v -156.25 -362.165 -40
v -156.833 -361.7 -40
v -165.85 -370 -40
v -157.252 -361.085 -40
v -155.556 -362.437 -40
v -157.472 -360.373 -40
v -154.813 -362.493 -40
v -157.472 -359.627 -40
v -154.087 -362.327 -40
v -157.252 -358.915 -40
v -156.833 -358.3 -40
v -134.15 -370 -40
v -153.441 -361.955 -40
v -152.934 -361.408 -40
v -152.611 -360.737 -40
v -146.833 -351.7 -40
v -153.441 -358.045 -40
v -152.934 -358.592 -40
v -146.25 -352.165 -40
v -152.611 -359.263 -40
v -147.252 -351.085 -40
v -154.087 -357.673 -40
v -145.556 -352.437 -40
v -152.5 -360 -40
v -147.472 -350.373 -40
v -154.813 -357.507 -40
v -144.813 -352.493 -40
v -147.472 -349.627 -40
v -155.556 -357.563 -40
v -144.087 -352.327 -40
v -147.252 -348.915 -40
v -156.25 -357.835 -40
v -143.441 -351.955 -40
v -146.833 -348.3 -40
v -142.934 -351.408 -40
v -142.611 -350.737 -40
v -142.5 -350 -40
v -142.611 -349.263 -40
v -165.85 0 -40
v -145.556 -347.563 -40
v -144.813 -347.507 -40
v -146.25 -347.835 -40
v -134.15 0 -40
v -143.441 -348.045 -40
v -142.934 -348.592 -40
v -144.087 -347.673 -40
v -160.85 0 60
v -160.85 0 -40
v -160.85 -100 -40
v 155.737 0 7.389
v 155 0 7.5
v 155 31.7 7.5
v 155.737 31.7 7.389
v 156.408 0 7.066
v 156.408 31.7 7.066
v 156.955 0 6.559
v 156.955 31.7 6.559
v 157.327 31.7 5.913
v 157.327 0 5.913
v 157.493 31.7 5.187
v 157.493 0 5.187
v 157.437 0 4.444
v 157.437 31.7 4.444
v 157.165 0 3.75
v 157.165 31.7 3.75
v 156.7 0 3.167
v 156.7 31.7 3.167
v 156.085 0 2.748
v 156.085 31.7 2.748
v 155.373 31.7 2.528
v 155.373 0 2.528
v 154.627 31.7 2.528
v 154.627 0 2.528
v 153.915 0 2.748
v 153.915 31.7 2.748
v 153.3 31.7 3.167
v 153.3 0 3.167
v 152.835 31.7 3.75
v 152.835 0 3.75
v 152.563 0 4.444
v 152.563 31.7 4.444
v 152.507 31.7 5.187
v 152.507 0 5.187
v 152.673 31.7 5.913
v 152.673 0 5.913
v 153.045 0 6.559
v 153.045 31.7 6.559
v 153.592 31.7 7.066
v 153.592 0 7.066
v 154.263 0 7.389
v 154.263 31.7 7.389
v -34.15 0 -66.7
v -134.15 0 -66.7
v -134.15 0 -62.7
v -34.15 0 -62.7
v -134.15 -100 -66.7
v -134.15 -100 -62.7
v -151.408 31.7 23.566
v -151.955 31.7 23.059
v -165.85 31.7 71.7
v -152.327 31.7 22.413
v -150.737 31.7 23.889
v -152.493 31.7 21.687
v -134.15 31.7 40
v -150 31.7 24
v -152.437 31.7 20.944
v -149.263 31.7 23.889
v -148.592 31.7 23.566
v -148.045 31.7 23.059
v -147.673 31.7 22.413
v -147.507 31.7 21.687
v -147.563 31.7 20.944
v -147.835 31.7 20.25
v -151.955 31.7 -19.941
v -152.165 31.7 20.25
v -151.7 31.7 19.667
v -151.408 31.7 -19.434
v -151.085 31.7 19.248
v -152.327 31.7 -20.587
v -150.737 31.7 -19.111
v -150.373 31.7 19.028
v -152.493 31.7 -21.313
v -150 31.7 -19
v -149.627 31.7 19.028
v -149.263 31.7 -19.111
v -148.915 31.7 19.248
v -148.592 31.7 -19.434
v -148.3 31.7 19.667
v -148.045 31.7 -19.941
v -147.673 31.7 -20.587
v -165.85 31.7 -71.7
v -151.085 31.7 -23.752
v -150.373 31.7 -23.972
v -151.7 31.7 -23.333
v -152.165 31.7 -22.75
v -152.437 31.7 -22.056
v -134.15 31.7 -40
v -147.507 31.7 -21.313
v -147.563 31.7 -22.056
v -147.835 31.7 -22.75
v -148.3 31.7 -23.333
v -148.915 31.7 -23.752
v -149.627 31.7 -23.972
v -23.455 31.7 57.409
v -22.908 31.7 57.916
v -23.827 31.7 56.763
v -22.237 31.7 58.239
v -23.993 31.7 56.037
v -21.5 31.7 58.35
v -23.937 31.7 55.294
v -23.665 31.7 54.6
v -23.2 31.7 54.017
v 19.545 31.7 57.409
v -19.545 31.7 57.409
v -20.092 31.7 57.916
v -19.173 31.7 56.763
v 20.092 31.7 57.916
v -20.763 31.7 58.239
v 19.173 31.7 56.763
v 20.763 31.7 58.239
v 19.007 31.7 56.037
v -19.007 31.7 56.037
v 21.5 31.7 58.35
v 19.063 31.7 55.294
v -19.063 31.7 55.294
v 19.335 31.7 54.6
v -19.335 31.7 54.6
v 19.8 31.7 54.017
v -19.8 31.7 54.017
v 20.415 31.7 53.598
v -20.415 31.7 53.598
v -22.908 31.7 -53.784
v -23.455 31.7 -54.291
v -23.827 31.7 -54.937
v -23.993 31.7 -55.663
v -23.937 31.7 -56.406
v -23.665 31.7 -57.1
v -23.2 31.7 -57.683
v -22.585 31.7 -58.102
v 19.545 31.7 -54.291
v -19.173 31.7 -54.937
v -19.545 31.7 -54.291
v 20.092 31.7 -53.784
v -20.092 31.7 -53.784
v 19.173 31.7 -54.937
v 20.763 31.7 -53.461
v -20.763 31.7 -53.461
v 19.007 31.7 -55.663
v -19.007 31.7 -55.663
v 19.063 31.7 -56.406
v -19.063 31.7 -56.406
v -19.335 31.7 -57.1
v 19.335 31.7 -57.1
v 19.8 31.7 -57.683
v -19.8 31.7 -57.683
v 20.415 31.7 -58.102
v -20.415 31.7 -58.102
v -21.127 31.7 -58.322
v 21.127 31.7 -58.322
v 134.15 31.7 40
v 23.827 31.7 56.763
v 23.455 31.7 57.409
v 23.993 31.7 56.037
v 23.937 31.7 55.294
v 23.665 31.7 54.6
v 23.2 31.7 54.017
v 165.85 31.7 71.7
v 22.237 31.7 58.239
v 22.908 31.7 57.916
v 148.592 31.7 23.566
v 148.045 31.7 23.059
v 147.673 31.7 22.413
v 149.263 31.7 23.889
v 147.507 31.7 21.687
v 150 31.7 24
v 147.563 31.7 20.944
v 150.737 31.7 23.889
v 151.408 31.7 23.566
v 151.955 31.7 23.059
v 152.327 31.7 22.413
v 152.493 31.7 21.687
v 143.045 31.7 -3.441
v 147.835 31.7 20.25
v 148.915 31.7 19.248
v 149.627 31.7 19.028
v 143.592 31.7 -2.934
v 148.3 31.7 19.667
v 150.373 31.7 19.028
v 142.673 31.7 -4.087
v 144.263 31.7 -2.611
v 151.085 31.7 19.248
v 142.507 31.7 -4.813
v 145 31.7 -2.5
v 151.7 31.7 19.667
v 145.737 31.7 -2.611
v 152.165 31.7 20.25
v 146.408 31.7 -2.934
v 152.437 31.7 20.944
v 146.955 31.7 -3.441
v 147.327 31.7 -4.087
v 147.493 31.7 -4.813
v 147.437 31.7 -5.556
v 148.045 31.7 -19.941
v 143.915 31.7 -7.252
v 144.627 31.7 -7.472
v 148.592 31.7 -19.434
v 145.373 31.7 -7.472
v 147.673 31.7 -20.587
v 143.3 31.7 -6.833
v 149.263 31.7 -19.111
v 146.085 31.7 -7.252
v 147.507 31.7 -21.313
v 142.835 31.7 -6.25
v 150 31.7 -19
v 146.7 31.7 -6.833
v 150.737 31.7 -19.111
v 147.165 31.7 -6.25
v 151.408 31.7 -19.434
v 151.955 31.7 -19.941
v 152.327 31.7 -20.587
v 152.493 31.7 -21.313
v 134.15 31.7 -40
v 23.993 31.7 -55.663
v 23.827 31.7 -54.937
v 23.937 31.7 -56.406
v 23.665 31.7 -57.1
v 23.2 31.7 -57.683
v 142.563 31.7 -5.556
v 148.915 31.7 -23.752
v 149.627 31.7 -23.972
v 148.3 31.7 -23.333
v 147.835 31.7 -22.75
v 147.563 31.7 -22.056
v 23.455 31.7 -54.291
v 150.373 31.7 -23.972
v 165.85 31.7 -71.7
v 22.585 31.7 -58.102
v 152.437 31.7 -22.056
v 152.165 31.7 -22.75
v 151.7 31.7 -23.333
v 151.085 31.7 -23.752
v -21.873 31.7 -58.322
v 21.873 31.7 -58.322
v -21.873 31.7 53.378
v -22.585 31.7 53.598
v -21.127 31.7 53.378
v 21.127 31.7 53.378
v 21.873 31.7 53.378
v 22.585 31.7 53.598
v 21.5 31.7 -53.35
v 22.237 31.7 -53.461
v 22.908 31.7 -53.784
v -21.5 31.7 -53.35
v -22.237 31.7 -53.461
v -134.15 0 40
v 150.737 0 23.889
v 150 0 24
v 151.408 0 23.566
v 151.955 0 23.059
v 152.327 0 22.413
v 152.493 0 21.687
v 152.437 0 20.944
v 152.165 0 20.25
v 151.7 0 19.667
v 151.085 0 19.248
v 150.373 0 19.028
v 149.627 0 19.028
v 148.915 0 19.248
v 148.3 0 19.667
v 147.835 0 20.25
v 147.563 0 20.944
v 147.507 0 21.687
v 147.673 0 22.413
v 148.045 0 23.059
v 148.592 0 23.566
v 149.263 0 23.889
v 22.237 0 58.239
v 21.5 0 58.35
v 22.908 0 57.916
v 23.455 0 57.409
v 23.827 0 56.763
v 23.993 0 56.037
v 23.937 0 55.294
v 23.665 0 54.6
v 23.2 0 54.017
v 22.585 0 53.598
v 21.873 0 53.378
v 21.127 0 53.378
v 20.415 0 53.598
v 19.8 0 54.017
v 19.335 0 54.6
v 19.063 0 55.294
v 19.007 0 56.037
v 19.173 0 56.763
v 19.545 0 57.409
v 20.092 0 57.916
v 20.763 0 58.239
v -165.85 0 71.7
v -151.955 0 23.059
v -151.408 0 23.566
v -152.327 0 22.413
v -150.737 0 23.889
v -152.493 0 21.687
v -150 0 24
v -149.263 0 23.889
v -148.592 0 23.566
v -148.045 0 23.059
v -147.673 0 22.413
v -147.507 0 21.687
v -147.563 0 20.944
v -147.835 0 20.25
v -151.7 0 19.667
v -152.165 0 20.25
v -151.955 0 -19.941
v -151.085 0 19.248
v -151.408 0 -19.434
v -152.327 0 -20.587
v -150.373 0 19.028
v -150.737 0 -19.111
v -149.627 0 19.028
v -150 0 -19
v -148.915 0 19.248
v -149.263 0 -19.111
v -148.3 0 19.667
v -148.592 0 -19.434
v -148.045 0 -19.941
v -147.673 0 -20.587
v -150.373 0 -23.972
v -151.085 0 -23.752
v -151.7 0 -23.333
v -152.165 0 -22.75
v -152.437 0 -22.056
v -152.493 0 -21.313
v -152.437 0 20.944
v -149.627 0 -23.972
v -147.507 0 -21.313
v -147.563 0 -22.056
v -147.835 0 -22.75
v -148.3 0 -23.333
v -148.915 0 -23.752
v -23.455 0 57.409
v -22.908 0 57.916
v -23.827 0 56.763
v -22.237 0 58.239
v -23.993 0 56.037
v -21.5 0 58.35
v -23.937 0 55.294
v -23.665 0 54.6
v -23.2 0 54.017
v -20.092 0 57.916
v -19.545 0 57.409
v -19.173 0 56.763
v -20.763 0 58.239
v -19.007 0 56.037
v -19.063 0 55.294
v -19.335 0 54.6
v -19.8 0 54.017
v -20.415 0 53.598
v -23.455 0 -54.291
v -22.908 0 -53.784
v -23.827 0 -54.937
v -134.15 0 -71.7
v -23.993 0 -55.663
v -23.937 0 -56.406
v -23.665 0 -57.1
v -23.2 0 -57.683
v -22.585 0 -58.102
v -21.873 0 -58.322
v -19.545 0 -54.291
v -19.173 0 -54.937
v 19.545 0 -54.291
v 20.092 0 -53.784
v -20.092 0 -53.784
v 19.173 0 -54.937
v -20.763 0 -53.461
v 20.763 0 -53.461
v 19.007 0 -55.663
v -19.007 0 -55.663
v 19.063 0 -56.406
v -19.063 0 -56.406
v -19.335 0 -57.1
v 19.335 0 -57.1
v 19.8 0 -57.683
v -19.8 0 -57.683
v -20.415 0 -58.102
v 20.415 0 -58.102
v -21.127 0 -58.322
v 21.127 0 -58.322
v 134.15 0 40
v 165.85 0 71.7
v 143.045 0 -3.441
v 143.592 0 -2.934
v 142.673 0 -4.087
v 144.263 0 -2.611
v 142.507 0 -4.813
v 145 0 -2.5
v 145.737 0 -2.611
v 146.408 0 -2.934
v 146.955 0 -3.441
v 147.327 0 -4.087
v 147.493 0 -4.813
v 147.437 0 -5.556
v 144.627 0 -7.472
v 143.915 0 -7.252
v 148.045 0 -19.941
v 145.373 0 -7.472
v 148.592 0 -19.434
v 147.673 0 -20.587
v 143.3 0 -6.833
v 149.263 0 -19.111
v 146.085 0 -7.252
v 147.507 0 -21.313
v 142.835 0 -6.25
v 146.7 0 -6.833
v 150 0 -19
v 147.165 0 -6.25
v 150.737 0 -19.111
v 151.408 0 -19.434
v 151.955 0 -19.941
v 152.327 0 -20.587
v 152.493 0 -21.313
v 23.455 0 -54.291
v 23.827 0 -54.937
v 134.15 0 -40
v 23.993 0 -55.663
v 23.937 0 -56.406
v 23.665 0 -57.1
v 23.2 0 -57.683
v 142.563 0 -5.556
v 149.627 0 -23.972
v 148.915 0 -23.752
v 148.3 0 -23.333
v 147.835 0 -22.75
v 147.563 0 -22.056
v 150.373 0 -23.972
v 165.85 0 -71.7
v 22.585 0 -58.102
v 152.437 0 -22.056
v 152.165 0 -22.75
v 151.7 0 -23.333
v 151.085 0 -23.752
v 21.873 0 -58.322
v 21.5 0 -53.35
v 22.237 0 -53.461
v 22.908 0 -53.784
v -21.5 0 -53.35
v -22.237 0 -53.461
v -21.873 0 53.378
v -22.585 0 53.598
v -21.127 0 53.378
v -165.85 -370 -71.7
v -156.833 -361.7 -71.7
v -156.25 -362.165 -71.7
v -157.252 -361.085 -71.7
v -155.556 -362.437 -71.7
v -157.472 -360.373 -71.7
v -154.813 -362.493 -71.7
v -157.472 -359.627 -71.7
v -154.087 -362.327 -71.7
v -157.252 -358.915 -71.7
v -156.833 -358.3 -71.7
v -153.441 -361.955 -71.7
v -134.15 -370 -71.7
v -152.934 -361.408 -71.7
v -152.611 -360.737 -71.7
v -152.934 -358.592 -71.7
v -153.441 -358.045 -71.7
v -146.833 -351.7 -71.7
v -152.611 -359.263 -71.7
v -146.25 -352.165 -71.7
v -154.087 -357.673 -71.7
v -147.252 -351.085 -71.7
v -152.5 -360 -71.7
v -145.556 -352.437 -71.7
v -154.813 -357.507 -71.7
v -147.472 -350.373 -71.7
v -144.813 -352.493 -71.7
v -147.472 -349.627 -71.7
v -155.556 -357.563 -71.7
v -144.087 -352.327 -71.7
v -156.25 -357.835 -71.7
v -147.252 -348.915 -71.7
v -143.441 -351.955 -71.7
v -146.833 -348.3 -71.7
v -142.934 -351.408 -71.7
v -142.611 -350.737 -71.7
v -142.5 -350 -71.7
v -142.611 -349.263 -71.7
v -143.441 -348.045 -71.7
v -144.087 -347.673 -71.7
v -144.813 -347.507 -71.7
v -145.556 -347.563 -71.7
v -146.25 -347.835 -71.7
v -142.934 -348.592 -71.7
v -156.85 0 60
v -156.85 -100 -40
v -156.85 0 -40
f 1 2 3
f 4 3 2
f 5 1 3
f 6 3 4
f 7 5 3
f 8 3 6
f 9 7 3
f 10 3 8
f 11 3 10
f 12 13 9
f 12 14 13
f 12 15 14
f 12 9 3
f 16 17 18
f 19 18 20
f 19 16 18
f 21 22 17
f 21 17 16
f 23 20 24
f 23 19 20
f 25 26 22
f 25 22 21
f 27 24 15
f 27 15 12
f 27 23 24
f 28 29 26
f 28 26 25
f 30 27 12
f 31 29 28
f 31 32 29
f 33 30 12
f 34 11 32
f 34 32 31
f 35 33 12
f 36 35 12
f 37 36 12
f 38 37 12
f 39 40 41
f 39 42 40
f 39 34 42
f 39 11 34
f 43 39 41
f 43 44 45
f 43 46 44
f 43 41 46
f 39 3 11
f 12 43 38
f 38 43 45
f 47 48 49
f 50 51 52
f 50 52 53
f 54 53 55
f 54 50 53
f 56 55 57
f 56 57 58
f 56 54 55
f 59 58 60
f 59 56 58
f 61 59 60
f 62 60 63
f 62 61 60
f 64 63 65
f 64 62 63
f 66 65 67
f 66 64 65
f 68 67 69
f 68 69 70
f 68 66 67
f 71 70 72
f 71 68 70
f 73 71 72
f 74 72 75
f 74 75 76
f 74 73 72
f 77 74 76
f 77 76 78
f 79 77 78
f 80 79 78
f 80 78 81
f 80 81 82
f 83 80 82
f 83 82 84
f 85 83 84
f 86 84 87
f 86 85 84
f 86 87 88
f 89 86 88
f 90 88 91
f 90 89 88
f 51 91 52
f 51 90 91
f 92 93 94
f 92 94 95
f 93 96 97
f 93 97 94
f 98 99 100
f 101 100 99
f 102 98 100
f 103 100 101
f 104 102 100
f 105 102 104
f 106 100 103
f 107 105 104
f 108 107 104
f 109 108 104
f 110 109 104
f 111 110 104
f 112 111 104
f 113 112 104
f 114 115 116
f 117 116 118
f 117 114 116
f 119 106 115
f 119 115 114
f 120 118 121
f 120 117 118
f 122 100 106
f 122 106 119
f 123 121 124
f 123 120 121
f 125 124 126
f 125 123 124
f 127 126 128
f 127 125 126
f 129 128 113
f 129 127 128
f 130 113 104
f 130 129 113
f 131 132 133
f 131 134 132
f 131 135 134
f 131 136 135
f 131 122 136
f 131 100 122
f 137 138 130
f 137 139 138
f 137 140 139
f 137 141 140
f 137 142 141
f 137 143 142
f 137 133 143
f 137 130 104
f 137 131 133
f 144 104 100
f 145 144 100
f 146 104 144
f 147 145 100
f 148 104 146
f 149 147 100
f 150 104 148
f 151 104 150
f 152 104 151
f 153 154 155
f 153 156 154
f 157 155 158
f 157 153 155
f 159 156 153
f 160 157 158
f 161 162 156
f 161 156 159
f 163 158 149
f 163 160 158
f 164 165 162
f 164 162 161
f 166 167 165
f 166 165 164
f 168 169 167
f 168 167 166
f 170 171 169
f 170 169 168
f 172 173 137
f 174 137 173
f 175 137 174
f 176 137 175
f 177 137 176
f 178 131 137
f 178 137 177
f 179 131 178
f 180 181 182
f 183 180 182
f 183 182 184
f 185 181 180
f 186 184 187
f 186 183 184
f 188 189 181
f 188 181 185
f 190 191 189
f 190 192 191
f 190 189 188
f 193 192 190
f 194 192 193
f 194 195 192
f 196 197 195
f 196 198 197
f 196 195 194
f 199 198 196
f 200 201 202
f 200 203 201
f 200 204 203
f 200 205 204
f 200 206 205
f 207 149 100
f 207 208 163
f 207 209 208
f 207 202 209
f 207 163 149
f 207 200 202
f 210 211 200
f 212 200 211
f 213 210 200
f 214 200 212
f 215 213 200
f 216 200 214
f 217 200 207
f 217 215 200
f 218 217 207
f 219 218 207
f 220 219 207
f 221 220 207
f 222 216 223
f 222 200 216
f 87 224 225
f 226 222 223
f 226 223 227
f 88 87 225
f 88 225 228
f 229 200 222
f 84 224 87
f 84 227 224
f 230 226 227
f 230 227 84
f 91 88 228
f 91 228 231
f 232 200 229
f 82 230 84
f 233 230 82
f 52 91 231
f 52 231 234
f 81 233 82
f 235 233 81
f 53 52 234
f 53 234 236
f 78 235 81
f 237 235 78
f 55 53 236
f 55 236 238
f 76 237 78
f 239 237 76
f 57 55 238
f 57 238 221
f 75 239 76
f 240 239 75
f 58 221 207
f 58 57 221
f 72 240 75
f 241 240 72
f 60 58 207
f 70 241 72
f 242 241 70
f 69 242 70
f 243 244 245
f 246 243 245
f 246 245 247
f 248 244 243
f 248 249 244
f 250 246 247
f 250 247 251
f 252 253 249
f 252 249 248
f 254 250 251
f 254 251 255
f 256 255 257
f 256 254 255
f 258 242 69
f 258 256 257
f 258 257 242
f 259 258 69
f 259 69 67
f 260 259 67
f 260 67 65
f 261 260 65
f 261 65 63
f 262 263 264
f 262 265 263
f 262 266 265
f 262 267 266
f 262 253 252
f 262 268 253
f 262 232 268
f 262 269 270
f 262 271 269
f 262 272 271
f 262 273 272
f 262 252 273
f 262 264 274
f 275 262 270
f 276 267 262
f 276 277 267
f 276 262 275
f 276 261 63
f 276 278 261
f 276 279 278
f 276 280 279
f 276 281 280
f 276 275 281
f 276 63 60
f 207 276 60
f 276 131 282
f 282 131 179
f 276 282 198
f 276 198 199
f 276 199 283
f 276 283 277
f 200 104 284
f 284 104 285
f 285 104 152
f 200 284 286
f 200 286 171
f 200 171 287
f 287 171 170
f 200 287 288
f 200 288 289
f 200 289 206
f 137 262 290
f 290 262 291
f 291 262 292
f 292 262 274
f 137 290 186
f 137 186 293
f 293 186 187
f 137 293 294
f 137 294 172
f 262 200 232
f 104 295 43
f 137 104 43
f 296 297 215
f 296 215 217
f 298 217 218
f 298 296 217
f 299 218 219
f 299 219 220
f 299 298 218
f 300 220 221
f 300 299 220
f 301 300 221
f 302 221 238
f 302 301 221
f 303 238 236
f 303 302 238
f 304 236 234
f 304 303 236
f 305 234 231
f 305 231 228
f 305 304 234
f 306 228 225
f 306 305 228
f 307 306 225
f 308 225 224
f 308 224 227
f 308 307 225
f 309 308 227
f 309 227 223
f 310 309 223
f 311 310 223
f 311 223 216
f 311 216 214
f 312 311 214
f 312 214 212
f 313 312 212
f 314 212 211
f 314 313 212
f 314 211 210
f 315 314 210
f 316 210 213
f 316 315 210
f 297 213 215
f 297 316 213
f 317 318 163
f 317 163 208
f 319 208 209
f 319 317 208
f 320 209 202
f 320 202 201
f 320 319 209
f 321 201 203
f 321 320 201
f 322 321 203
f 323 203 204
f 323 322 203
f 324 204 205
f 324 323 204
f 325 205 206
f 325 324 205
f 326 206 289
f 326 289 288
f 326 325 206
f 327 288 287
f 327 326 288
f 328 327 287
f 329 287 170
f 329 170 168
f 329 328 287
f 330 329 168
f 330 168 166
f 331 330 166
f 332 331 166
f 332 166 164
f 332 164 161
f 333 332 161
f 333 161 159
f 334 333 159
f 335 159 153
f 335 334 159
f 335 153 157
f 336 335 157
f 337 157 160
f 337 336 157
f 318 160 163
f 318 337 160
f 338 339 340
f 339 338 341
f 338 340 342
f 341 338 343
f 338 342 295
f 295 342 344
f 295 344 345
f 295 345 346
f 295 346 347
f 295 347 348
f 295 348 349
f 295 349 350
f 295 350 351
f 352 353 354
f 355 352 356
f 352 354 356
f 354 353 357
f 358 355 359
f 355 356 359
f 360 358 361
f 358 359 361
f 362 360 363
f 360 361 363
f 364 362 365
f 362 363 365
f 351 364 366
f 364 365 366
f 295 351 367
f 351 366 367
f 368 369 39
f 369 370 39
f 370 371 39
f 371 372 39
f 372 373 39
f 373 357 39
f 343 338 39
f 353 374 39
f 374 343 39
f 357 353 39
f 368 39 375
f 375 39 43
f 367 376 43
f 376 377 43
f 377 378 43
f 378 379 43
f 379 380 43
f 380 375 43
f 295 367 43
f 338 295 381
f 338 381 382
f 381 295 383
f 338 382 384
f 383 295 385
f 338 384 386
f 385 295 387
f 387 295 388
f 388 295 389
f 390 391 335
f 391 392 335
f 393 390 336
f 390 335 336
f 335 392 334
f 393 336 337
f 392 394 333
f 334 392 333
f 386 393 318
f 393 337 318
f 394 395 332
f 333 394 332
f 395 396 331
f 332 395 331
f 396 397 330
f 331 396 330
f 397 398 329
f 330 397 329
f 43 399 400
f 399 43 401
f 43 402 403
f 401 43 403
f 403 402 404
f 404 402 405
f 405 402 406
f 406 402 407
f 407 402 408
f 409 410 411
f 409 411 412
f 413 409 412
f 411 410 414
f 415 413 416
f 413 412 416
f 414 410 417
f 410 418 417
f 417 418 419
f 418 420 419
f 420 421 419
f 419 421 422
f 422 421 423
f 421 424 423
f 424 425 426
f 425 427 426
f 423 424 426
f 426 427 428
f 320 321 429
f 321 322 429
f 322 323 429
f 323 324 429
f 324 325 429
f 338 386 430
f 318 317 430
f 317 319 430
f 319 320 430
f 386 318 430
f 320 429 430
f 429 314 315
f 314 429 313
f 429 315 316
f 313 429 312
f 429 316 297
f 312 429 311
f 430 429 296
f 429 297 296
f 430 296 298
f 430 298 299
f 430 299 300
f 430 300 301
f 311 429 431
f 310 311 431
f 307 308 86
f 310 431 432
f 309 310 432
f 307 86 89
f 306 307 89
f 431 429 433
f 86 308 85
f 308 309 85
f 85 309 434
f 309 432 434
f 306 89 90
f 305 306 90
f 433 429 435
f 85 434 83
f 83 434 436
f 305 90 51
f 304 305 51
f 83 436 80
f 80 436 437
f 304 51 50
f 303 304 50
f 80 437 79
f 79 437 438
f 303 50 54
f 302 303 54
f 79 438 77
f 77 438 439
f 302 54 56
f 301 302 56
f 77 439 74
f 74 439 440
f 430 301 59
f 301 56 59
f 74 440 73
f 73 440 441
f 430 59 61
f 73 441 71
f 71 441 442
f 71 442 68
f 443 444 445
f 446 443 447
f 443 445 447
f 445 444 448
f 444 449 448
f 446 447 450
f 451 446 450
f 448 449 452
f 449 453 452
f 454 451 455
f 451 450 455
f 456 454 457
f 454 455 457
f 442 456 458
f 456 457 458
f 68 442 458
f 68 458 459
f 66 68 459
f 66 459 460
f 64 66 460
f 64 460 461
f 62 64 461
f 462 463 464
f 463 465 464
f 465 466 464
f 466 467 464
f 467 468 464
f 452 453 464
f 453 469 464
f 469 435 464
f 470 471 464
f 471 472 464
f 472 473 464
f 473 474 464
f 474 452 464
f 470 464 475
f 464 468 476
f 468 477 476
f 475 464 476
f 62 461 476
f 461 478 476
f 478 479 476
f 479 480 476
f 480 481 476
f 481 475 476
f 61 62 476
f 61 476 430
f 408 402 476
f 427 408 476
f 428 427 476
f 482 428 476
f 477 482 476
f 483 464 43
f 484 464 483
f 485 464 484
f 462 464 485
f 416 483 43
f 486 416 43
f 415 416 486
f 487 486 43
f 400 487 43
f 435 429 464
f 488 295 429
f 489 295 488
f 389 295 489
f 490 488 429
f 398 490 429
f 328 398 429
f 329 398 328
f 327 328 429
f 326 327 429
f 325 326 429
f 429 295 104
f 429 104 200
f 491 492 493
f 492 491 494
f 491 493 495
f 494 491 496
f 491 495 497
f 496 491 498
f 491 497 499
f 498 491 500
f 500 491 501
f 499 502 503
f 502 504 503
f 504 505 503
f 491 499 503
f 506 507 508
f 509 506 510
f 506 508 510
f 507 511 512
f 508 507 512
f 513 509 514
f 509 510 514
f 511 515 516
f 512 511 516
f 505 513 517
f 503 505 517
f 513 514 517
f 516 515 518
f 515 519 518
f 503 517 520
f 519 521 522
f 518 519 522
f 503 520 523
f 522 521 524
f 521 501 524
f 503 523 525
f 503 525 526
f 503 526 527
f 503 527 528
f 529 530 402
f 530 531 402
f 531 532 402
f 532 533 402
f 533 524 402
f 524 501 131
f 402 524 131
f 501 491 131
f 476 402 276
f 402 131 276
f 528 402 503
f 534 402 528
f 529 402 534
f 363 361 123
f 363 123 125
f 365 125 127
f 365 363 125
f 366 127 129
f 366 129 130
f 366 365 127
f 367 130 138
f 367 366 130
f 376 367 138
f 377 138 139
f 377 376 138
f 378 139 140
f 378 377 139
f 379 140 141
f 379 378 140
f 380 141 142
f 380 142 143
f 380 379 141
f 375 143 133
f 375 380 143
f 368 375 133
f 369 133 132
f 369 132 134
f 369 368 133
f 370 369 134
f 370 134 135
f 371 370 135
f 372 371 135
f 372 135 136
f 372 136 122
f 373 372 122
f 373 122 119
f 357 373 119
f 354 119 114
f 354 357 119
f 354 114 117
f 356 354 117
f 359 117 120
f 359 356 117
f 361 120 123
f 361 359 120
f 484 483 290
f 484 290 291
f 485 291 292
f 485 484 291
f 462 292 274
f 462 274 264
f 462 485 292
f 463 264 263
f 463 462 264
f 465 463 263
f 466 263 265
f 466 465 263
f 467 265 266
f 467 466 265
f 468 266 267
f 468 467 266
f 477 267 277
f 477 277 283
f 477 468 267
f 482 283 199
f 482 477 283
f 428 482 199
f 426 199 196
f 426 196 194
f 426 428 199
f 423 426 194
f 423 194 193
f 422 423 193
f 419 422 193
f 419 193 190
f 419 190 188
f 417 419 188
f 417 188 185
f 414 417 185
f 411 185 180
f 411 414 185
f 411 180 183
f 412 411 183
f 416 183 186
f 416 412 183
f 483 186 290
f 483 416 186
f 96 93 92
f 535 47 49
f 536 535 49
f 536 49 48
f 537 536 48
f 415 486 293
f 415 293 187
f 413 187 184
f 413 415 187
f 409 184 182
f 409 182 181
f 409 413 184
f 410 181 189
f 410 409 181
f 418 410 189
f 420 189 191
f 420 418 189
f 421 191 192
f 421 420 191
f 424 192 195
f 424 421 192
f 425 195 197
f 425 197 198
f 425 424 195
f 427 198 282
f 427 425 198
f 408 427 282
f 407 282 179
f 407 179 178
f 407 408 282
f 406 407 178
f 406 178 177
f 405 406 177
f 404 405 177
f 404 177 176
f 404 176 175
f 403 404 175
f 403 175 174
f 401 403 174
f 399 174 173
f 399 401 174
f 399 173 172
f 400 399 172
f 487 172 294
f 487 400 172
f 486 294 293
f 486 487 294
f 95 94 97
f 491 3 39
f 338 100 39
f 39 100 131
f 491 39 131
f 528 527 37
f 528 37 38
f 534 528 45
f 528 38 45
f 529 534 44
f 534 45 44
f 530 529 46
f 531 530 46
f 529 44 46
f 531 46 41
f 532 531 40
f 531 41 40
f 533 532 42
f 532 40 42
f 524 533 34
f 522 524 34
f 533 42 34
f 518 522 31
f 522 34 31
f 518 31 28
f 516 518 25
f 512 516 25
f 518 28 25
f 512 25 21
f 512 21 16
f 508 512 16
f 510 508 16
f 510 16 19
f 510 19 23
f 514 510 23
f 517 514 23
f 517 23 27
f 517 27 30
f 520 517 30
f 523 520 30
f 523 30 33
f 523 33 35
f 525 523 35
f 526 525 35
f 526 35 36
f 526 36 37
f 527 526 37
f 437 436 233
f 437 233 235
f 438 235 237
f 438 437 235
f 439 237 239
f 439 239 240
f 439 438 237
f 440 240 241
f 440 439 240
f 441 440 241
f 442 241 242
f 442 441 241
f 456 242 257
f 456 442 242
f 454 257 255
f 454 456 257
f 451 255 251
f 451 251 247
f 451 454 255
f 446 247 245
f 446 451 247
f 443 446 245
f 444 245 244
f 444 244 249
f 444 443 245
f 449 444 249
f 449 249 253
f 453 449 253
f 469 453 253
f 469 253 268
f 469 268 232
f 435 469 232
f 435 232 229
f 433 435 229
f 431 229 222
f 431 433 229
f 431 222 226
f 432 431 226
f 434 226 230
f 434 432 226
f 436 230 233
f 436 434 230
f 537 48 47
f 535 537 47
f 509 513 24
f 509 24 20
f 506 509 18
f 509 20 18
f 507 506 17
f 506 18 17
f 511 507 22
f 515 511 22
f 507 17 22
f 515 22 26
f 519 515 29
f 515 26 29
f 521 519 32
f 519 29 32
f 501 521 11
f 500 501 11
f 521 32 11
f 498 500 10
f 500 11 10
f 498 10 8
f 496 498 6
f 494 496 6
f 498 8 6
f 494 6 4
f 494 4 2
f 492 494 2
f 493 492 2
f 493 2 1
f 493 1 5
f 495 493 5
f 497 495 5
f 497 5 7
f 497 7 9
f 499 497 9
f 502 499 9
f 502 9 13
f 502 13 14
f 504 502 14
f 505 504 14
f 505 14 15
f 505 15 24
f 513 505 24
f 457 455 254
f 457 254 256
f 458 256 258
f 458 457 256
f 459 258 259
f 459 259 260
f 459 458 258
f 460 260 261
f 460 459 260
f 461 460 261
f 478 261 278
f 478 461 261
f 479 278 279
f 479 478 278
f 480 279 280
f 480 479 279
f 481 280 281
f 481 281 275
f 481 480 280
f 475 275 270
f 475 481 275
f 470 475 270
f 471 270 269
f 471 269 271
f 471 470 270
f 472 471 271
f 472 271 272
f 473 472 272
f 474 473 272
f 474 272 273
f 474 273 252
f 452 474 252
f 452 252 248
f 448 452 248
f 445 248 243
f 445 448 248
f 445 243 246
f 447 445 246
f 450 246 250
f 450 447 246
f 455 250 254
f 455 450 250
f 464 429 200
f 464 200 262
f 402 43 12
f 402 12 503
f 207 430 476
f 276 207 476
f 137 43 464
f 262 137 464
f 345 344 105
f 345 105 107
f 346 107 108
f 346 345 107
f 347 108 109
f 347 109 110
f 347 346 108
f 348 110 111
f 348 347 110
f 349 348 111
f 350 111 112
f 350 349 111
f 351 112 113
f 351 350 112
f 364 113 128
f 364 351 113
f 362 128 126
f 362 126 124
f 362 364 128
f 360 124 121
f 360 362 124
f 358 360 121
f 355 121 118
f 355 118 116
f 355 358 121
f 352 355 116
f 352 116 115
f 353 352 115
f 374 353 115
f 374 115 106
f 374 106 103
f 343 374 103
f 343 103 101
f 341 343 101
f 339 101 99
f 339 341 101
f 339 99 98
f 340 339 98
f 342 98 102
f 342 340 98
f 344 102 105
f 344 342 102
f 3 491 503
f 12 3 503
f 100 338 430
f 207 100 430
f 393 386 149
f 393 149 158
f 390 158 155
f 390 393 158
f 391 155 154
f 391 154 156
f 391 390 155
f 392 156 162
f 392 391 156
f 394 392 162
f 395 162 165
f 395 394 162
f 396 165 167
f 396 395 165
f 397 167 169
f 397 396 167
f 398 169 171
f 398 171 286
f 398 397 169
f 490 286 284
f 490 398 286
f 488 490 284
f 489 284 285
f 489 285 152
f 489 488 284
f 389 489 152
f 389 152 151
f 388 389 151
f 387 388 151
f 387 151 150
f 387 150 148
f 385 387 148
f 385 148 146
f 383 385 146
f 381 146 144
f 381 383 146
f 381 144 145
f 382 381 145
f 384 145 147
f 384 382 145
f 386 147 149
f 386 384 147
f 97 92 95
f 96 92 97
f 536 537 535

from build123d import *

# Parameters (mm, degrees)
ESBO_O1_W                = 331.7
ESBO_O1_H                = 143.4
RESSALTO_EXTRUS_O2_DEPTH = 31.7
ESBO_O3_W                = 268.3
ESBO_O3_H                = 80
CORTE_EXTRUS_O1_DEPTH    = 31.7
ESBO_O4_R                = 2.5
CORTE_EXTRUS_O2_DEPTH    = 31.7
ESBO_O6_W                = 31.7
ESBO_O6_H                = 31.7
RESSALTO_EXTRUS_O3_DEPTH = 370
ESBO_O7_R                = 2.5
CORTE_EXTRUS_O3_DEPTH    = 412.760989532
RESSALTO_EXTRUS_O4_DEPTH = 4
RESSALTO_EXTRUS_O5_DEPTH = 4


with BuildPart() as part:
    # Esboço1 → Ressalto-extrusão2 (new body)
    with BuildSketch(Plane(origin=(0, 0, 0), x_dir=(1, 0, 0), z_dir=(0, 1, 0))):
        Rectangle(ESBO_O1_W, ESBO_O1_H)
    extrude(amount=RESSALTO_EXTRUS_O2_DEPTH)

    # Esboço3 → Corte-extrusão1 (cut)
    with BuildSketch(Plane(origin=(0, 0, 0), x_dir=(1, 0, 0), z_dir=(0, 1, 0))):
        Rectangle(ESBO_O3_W, ESBO_O3_H)
    extrude(amount=CORTE_EXTRUS_O1_DEPTH, mode=Mode.SUBTRACT)

    # Esboço4 → Corte-extrusão2 (cut)
    with BuildSketch(Plane(origin=(0, 0, 0), x_dir=(1, 0, 0), z_dir=(0, 1, 0))):
        with Locations(Location((21.5, -55.85, 0), (0, 0, 270))):
            Circle(ESBO_O4_R)
        with Locations(Location((-21.5, -55.85, 0), (0, 0, 270))):
            Circle(ESBO_O4_R)
        with Locations(Location((21.5, 55.85, 0), (0, 0, 270))):
            Circle(ESBO_O4_R)
        with Locations(Location((-21.5, 55.85, 0), (0, 0, 270))):
            Circle(ESBO_O4_R)
        with Locations(Location((150, -21.5, 0), (0, 0, 270))):
            Circle(ESBO_O4_R)
        with Locations(Location((150, 21.5, 0), (0, 0, 270))):
            Circle(ESBO_O4_R)
        with Locations(Location((-150, 21.5, 0), (0, 0, 270))):
            Circle(ESBO_O4_R)
        with Locations(Location((-150, -21.5, 0), (0, 0, 270))):
            Circle(ESBO_O4_R)
        with Locations(Location((145, 5, 0), (0, 0, 270))):
            Circle(ESBO_O4_R)
        with Locations(Location((155, -5, 0), (0, 0, 270))):
            Circle(ESBO_O4_R)
    extrude(amount=CORTE_EXTRUS_O2_DEPTH, mode=Mode.SUBTRACT)

    # Esboço6 → Ressalto-extrusão3 (add)
    with BuildSketch(Plane(origin=(0, 0, 0), x_dir=(1, 0, 0), z_dir=(0, 1, 0))):
        with Locations((-150, 55.85)):
            Rectangle(ESBO_O6_W, ESBO_O6_H)
    extrude(amount=-RESSALTO_EXTRUS_O3_DEPTH)

    # Esboço7 → Corte-extrusão3 (cut, through all)
    with BuildSketch(Plane.XY):
        with Locations((-155, -360)):
            Circle(ESBO_O7_R)
        with Locations((-145, -350)):
            Circle(ESBO_O7_R)
    extrude(amount=-CORTE_EXTRUS_O3_DEPTH, mode=Mode.SUBTRACT)


with BuildPart() as body_2:
    # Esboço9 → Ressalto-extrusão4 (new body)
    with BuildSketch(Plane(origin=(-160.85, 0, 0), x_dir=(0, 0, 1), z_dir=(1, 0, 0))):
        Polygon((-40, 0), (60, 0), (-40, 100), align=None)
    extrude(amount=RESSALTO_EXTRUS_O4_DEPTH)


with BuildPart() as body_3:
    # Esboço10 → Ressalto-extrusão5 (new body)
    with BuildSketch(Plane(origin=(0, 0, -66.7), x_dir=(1, 0, 0), z_dir=(0, 0, -1))):
        Polygon((-134.15, 0), (-34.15, 0), (-134.15, 100), align=None)
    extrude(amount=-RESSALTO_EXTRUS_O5_DEPTH)


solid = Compound([part.part, body_2.part, body_3.part])
